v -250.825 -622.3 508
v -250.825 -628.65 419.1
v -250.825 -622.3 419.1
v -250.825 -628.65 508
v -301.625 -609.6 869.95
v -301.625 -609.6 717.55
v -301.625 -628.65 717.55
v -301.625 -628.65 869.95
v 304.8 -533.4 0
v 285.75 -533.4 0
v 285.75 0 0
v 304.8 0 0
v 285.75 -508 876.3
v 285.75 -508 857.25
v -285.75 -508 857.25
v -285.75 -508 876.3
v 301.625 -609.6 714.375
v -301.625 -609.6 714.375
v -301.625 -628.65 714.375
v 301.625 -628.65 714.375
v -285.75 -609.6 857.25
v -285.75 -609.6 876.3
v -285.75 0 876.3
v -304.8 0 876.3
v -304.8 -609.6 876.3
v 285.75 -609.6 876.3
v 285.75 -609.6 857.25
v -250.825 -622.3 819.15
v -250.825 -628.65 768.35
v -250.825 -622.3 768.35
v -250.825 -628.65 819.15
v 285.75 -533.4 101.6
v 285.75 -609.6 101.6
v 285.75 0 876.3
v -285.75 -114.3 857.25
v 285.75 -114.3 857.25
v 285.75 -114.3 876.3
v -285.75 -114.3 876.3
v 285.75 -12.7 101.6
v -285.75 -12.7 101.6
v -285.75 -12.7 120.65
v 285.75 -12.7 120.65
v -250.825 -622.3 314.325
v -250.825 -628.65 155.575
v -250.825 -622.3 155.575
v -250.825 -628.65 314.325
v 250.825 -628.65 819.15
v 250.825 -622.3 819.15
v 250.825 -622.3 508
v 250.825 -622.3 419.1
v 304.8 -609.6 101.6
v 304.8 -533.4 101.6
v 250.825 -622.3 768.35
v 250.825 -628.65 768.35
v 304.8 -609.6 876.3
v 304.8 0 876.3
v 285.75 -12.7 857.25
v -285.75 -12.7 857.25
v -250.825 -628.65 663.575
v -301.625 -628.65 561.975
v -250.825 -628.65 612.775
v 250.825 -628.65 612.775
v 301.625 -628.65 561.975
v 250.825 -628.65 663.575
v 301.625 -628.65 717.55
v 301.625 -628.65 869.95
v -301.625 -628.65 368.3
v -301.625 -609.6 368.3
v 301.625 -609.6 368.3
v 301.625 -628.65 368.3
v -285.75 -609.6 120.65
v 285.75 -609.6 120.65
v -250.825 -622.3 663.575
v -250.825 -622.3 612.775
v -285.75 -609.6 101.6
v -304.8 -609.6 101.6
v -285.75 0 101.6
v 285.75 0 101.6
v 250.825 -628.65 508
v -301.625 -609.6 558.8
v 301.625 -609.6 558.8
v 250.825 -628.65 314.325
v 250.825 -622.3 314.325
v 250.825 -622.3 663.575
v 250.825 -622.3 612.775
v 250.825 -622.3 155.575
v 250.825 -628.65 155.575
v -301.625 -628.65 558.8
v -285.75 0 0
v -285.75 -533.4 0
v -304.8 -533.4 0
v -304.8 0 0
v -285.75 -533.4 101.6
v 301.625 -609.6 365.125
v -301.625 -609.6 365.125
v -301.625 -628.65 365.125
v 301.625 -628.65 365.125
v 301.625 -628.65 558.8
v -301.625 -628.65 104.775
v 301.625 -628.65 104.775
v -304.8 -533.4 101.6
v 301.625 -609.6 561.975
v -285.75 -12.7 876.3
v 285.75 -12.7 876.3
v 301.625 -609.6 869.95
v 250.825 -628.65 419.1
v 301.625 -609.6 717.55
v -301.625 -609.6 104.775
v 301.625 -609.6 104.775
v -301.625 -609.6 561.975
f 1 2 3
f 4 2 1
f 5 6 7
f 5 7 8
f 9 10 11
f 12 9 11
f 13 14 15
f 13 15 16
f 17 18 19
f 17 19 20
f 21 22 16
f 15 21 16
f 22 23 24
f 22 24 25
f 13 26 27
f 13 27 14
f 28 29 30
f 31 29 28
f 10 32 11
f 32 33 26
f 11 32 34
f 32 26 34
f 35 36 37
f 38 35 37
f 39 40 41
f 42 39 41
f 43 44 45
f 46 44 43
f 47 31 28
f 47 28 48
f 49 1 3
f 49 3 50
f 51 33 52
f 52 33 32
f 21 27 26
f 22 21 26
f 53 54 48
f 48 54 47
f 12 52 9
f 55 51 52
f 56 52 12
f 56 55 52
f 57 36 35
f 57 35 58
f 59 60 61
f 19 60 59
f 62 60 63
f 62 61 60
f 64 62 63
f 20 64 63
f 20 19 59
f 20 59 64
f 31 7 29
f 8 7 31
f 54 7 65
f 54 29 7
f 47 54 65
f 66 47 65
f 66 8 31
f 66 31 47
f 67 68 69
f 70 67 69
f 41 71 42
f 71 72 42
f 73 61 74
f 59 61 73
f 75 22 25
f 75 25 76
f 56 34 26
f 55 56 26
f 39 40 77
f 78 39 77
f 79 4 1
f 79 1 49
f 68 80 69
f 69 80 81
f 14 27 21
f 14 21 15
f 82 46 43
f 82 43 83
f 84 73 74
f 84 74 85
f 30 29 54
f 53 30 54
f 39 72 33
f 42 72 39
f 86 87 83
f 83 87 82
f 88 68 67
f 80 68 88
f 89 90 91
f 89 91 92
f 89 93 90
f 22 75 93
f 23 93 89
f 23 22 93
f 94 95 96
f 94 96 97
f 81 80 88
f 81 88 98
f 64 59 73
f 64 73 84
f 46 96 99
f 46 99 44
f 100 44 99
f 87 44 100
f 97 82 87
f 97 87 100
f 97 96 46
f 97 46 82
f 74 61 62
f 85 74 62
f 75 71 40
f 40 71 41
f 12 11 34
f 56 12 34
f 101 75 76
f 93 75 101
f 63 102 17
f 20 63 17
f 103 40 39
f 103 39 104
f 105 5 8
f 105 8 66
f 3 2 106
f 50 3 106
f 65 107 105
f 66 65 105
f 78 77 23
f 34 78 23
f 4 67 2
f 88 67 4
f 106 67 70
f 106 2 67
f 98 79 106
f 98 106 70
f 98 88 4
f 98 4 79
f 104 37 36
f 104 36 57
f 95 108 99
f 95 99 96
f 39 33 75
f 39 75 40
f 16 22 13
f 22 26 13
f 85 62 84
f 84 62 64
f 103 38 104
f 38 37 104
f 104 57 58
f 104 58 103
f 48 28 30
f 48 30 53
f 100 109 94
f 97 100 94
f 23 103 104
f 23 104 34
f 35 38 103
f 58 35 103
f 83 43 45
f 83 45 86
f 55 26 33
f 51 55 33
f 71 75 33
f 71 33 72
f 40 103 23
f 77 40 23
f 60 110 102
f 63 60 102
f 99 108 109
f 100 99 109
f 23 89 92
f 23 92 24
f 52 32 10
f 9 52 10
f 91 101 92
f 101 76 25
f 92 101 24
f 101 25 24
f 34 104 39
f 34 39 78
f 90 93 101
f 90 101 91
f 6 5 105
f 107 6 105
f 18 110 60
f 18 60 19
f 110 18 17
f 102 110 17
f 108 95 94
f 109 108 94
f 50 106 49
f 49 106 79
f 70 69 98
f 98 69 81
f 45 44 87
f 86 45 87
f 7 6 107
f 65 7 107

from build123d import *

# Parameters (mm, degrees)
F1_W      = 596.9
F1_H      = 19.05
F2_DEPTH  = 285.75
F1_W_2    = 101.6
F4_DEPTH  = 19.05
F6_W      = 12.7
F6_H      = 774.7
F7_DEPTH  = 571.5
F8_W      = 603.25
F8_H      = 152.4
F9_DEPTH  = 19.05
F8_H_2    = 190.5
F8_H_3    = 260.35
F10_W     = 501.65
F10_H     = 50.8
F10_H_2   = 88.9
F10_H_3   = 158.75
F11_DEPTH = 6.35


with BuildPart() as f2:
    # F1 (on Right) → F2 (new body, symmetric)
    with BuildSketch(Plane.YZ):
        with Locations((-311.15, 111.125)):
            Rectangle(F1_W, F1_H)
    extrude(amount=F2_DEPTH, both=True)


with BuildPart() as f2b:
    # F1 (on Right) → F2, piece 2 (new body, symmetric)
    with BuildSketch(Plane.YZ):
        with Locations((-558.8, 866.775)):
            Rectangle(F1_W_2, F1_H)
    extrude(amount=F2_DEPTH, both=True)


with BuildPart() as f2c:
    # F1 (on Right) → F2, piece 3 (new body, symmetric)
    with BuildSketch(Plane.YZ):
        with Locations((-63.5, 866.775)):
            Rectangle(F1_W_2, F1_H)
    extrude(amount=F2_DEPTH, both=True)


with BuildPart() as f4:
    # F3 (on face) → F4 (new body)
    with BuildSketch(Plane.YZ.offset(285.75)):
        Polygon((0, 876.3), (-609.6, 876.3), (-609.6, 101.6), (-533.4, 101.6), (-533.4, 0), (0, 0), align=None)
    extrude(amount=F4_DEPTH)


with BuildPart() as f5_1:
    # F5: instance of F4
    add(f4.part.mirror(Plane.YZ))


with BuildPart() as f7:
    # F6 (on face) → F7 (new body, through all)
    with BuildSketch(Plane.YZ.offset(-285.75)):
        with Locations((-6.35, 488.95)):
            Rectangle(F6_W, F6_H)
    extrude(amount=F7_DEPTH)


with BuildPart() as f9:
    # F8 (on face) → F9 (new body)
    with BuildSketch(Plane.XZ.offset(609.6)):
        with Locations((0, 793.75)):
            Rectangle(F8_W, F8_H)
    extrude(amount=F9_DEPTH)


with BuildPart() as f9b:
    # F8 (on face) → F9, piece 2 (new body)
    with BuildSketch(Plane.XZ.offset(609.6)):
        with Locations((0, 638.175)):
            Rectangle(F8_W, F8_H)
    extrude(amount=F9_DEPTH)


with BuildPart() as f9c:
    # F8 (on face) → F9, piece 3 (new body)
    with BuildSketch(Plane.XZ.offset(609.6)):
        with Locations((0, 463.55)):
            Rectangle(F8_W, F8_H_2)
    extrude(amount=F9_DEPTH)


with BuildPart() as f9d:
    # F8 (on face) → F9, piece 4 (new body)
    with BuildSketch(Plane.XZ.offset(609.6)):
        with Locations((0, 234.95)):
            Rectangle(F8_W, F8_H_3)
    extrude(amount=F9_DEPTH)


with BuildPart() as f11_tool:
    # F10 (on face) → F11 (new body)
    with BuildSketch(Plane.XZ.offset(628.65)):
        with Locations((0, 793.75)):
            Rectangle(F10_W, F10_H)
        with Locations((0, 638.175)):
            Rectangle(F10_W, F10_H)
        with Locations((0, 463.55)):
            Rectangle(F10_W, F10_H_2)
        with Locations((0, 234.95)):
            Rectangle(F10_W, F10_H_3)
    extrude(amount=-F11_DEPTH)


with BuildPart() as f9_1:
    add(f9.part)

    # F11: cut by f11_tool
    add(f11_tool.part, mode=Mode.SUBTRACT)


with BuildPart() as f9b_1:
    add(f9b.part)

    # F11: cut by f11_tool
    add(f11_tool.part, mode=Mode.SUBTRACT)


with BuildPart() as f9c_1:
    add(f9c.part)

    # F11: cut by f11_tool
    add(f11_tool.part, mode=Mode.SUBTRACT)


with BuildPart() as f9d_1:
    add(f9d.part)

    # F11: cut by f11_tool
    add(f11_tool.part, mode=Mode.SUBTRACT)


solid = Compound([f2.part, f2b.part, f2c.part, f4.part, f5_1.part, f7.part, f9_1.part, f9b_1.part, f9c_1.part, f9d_1.part])
